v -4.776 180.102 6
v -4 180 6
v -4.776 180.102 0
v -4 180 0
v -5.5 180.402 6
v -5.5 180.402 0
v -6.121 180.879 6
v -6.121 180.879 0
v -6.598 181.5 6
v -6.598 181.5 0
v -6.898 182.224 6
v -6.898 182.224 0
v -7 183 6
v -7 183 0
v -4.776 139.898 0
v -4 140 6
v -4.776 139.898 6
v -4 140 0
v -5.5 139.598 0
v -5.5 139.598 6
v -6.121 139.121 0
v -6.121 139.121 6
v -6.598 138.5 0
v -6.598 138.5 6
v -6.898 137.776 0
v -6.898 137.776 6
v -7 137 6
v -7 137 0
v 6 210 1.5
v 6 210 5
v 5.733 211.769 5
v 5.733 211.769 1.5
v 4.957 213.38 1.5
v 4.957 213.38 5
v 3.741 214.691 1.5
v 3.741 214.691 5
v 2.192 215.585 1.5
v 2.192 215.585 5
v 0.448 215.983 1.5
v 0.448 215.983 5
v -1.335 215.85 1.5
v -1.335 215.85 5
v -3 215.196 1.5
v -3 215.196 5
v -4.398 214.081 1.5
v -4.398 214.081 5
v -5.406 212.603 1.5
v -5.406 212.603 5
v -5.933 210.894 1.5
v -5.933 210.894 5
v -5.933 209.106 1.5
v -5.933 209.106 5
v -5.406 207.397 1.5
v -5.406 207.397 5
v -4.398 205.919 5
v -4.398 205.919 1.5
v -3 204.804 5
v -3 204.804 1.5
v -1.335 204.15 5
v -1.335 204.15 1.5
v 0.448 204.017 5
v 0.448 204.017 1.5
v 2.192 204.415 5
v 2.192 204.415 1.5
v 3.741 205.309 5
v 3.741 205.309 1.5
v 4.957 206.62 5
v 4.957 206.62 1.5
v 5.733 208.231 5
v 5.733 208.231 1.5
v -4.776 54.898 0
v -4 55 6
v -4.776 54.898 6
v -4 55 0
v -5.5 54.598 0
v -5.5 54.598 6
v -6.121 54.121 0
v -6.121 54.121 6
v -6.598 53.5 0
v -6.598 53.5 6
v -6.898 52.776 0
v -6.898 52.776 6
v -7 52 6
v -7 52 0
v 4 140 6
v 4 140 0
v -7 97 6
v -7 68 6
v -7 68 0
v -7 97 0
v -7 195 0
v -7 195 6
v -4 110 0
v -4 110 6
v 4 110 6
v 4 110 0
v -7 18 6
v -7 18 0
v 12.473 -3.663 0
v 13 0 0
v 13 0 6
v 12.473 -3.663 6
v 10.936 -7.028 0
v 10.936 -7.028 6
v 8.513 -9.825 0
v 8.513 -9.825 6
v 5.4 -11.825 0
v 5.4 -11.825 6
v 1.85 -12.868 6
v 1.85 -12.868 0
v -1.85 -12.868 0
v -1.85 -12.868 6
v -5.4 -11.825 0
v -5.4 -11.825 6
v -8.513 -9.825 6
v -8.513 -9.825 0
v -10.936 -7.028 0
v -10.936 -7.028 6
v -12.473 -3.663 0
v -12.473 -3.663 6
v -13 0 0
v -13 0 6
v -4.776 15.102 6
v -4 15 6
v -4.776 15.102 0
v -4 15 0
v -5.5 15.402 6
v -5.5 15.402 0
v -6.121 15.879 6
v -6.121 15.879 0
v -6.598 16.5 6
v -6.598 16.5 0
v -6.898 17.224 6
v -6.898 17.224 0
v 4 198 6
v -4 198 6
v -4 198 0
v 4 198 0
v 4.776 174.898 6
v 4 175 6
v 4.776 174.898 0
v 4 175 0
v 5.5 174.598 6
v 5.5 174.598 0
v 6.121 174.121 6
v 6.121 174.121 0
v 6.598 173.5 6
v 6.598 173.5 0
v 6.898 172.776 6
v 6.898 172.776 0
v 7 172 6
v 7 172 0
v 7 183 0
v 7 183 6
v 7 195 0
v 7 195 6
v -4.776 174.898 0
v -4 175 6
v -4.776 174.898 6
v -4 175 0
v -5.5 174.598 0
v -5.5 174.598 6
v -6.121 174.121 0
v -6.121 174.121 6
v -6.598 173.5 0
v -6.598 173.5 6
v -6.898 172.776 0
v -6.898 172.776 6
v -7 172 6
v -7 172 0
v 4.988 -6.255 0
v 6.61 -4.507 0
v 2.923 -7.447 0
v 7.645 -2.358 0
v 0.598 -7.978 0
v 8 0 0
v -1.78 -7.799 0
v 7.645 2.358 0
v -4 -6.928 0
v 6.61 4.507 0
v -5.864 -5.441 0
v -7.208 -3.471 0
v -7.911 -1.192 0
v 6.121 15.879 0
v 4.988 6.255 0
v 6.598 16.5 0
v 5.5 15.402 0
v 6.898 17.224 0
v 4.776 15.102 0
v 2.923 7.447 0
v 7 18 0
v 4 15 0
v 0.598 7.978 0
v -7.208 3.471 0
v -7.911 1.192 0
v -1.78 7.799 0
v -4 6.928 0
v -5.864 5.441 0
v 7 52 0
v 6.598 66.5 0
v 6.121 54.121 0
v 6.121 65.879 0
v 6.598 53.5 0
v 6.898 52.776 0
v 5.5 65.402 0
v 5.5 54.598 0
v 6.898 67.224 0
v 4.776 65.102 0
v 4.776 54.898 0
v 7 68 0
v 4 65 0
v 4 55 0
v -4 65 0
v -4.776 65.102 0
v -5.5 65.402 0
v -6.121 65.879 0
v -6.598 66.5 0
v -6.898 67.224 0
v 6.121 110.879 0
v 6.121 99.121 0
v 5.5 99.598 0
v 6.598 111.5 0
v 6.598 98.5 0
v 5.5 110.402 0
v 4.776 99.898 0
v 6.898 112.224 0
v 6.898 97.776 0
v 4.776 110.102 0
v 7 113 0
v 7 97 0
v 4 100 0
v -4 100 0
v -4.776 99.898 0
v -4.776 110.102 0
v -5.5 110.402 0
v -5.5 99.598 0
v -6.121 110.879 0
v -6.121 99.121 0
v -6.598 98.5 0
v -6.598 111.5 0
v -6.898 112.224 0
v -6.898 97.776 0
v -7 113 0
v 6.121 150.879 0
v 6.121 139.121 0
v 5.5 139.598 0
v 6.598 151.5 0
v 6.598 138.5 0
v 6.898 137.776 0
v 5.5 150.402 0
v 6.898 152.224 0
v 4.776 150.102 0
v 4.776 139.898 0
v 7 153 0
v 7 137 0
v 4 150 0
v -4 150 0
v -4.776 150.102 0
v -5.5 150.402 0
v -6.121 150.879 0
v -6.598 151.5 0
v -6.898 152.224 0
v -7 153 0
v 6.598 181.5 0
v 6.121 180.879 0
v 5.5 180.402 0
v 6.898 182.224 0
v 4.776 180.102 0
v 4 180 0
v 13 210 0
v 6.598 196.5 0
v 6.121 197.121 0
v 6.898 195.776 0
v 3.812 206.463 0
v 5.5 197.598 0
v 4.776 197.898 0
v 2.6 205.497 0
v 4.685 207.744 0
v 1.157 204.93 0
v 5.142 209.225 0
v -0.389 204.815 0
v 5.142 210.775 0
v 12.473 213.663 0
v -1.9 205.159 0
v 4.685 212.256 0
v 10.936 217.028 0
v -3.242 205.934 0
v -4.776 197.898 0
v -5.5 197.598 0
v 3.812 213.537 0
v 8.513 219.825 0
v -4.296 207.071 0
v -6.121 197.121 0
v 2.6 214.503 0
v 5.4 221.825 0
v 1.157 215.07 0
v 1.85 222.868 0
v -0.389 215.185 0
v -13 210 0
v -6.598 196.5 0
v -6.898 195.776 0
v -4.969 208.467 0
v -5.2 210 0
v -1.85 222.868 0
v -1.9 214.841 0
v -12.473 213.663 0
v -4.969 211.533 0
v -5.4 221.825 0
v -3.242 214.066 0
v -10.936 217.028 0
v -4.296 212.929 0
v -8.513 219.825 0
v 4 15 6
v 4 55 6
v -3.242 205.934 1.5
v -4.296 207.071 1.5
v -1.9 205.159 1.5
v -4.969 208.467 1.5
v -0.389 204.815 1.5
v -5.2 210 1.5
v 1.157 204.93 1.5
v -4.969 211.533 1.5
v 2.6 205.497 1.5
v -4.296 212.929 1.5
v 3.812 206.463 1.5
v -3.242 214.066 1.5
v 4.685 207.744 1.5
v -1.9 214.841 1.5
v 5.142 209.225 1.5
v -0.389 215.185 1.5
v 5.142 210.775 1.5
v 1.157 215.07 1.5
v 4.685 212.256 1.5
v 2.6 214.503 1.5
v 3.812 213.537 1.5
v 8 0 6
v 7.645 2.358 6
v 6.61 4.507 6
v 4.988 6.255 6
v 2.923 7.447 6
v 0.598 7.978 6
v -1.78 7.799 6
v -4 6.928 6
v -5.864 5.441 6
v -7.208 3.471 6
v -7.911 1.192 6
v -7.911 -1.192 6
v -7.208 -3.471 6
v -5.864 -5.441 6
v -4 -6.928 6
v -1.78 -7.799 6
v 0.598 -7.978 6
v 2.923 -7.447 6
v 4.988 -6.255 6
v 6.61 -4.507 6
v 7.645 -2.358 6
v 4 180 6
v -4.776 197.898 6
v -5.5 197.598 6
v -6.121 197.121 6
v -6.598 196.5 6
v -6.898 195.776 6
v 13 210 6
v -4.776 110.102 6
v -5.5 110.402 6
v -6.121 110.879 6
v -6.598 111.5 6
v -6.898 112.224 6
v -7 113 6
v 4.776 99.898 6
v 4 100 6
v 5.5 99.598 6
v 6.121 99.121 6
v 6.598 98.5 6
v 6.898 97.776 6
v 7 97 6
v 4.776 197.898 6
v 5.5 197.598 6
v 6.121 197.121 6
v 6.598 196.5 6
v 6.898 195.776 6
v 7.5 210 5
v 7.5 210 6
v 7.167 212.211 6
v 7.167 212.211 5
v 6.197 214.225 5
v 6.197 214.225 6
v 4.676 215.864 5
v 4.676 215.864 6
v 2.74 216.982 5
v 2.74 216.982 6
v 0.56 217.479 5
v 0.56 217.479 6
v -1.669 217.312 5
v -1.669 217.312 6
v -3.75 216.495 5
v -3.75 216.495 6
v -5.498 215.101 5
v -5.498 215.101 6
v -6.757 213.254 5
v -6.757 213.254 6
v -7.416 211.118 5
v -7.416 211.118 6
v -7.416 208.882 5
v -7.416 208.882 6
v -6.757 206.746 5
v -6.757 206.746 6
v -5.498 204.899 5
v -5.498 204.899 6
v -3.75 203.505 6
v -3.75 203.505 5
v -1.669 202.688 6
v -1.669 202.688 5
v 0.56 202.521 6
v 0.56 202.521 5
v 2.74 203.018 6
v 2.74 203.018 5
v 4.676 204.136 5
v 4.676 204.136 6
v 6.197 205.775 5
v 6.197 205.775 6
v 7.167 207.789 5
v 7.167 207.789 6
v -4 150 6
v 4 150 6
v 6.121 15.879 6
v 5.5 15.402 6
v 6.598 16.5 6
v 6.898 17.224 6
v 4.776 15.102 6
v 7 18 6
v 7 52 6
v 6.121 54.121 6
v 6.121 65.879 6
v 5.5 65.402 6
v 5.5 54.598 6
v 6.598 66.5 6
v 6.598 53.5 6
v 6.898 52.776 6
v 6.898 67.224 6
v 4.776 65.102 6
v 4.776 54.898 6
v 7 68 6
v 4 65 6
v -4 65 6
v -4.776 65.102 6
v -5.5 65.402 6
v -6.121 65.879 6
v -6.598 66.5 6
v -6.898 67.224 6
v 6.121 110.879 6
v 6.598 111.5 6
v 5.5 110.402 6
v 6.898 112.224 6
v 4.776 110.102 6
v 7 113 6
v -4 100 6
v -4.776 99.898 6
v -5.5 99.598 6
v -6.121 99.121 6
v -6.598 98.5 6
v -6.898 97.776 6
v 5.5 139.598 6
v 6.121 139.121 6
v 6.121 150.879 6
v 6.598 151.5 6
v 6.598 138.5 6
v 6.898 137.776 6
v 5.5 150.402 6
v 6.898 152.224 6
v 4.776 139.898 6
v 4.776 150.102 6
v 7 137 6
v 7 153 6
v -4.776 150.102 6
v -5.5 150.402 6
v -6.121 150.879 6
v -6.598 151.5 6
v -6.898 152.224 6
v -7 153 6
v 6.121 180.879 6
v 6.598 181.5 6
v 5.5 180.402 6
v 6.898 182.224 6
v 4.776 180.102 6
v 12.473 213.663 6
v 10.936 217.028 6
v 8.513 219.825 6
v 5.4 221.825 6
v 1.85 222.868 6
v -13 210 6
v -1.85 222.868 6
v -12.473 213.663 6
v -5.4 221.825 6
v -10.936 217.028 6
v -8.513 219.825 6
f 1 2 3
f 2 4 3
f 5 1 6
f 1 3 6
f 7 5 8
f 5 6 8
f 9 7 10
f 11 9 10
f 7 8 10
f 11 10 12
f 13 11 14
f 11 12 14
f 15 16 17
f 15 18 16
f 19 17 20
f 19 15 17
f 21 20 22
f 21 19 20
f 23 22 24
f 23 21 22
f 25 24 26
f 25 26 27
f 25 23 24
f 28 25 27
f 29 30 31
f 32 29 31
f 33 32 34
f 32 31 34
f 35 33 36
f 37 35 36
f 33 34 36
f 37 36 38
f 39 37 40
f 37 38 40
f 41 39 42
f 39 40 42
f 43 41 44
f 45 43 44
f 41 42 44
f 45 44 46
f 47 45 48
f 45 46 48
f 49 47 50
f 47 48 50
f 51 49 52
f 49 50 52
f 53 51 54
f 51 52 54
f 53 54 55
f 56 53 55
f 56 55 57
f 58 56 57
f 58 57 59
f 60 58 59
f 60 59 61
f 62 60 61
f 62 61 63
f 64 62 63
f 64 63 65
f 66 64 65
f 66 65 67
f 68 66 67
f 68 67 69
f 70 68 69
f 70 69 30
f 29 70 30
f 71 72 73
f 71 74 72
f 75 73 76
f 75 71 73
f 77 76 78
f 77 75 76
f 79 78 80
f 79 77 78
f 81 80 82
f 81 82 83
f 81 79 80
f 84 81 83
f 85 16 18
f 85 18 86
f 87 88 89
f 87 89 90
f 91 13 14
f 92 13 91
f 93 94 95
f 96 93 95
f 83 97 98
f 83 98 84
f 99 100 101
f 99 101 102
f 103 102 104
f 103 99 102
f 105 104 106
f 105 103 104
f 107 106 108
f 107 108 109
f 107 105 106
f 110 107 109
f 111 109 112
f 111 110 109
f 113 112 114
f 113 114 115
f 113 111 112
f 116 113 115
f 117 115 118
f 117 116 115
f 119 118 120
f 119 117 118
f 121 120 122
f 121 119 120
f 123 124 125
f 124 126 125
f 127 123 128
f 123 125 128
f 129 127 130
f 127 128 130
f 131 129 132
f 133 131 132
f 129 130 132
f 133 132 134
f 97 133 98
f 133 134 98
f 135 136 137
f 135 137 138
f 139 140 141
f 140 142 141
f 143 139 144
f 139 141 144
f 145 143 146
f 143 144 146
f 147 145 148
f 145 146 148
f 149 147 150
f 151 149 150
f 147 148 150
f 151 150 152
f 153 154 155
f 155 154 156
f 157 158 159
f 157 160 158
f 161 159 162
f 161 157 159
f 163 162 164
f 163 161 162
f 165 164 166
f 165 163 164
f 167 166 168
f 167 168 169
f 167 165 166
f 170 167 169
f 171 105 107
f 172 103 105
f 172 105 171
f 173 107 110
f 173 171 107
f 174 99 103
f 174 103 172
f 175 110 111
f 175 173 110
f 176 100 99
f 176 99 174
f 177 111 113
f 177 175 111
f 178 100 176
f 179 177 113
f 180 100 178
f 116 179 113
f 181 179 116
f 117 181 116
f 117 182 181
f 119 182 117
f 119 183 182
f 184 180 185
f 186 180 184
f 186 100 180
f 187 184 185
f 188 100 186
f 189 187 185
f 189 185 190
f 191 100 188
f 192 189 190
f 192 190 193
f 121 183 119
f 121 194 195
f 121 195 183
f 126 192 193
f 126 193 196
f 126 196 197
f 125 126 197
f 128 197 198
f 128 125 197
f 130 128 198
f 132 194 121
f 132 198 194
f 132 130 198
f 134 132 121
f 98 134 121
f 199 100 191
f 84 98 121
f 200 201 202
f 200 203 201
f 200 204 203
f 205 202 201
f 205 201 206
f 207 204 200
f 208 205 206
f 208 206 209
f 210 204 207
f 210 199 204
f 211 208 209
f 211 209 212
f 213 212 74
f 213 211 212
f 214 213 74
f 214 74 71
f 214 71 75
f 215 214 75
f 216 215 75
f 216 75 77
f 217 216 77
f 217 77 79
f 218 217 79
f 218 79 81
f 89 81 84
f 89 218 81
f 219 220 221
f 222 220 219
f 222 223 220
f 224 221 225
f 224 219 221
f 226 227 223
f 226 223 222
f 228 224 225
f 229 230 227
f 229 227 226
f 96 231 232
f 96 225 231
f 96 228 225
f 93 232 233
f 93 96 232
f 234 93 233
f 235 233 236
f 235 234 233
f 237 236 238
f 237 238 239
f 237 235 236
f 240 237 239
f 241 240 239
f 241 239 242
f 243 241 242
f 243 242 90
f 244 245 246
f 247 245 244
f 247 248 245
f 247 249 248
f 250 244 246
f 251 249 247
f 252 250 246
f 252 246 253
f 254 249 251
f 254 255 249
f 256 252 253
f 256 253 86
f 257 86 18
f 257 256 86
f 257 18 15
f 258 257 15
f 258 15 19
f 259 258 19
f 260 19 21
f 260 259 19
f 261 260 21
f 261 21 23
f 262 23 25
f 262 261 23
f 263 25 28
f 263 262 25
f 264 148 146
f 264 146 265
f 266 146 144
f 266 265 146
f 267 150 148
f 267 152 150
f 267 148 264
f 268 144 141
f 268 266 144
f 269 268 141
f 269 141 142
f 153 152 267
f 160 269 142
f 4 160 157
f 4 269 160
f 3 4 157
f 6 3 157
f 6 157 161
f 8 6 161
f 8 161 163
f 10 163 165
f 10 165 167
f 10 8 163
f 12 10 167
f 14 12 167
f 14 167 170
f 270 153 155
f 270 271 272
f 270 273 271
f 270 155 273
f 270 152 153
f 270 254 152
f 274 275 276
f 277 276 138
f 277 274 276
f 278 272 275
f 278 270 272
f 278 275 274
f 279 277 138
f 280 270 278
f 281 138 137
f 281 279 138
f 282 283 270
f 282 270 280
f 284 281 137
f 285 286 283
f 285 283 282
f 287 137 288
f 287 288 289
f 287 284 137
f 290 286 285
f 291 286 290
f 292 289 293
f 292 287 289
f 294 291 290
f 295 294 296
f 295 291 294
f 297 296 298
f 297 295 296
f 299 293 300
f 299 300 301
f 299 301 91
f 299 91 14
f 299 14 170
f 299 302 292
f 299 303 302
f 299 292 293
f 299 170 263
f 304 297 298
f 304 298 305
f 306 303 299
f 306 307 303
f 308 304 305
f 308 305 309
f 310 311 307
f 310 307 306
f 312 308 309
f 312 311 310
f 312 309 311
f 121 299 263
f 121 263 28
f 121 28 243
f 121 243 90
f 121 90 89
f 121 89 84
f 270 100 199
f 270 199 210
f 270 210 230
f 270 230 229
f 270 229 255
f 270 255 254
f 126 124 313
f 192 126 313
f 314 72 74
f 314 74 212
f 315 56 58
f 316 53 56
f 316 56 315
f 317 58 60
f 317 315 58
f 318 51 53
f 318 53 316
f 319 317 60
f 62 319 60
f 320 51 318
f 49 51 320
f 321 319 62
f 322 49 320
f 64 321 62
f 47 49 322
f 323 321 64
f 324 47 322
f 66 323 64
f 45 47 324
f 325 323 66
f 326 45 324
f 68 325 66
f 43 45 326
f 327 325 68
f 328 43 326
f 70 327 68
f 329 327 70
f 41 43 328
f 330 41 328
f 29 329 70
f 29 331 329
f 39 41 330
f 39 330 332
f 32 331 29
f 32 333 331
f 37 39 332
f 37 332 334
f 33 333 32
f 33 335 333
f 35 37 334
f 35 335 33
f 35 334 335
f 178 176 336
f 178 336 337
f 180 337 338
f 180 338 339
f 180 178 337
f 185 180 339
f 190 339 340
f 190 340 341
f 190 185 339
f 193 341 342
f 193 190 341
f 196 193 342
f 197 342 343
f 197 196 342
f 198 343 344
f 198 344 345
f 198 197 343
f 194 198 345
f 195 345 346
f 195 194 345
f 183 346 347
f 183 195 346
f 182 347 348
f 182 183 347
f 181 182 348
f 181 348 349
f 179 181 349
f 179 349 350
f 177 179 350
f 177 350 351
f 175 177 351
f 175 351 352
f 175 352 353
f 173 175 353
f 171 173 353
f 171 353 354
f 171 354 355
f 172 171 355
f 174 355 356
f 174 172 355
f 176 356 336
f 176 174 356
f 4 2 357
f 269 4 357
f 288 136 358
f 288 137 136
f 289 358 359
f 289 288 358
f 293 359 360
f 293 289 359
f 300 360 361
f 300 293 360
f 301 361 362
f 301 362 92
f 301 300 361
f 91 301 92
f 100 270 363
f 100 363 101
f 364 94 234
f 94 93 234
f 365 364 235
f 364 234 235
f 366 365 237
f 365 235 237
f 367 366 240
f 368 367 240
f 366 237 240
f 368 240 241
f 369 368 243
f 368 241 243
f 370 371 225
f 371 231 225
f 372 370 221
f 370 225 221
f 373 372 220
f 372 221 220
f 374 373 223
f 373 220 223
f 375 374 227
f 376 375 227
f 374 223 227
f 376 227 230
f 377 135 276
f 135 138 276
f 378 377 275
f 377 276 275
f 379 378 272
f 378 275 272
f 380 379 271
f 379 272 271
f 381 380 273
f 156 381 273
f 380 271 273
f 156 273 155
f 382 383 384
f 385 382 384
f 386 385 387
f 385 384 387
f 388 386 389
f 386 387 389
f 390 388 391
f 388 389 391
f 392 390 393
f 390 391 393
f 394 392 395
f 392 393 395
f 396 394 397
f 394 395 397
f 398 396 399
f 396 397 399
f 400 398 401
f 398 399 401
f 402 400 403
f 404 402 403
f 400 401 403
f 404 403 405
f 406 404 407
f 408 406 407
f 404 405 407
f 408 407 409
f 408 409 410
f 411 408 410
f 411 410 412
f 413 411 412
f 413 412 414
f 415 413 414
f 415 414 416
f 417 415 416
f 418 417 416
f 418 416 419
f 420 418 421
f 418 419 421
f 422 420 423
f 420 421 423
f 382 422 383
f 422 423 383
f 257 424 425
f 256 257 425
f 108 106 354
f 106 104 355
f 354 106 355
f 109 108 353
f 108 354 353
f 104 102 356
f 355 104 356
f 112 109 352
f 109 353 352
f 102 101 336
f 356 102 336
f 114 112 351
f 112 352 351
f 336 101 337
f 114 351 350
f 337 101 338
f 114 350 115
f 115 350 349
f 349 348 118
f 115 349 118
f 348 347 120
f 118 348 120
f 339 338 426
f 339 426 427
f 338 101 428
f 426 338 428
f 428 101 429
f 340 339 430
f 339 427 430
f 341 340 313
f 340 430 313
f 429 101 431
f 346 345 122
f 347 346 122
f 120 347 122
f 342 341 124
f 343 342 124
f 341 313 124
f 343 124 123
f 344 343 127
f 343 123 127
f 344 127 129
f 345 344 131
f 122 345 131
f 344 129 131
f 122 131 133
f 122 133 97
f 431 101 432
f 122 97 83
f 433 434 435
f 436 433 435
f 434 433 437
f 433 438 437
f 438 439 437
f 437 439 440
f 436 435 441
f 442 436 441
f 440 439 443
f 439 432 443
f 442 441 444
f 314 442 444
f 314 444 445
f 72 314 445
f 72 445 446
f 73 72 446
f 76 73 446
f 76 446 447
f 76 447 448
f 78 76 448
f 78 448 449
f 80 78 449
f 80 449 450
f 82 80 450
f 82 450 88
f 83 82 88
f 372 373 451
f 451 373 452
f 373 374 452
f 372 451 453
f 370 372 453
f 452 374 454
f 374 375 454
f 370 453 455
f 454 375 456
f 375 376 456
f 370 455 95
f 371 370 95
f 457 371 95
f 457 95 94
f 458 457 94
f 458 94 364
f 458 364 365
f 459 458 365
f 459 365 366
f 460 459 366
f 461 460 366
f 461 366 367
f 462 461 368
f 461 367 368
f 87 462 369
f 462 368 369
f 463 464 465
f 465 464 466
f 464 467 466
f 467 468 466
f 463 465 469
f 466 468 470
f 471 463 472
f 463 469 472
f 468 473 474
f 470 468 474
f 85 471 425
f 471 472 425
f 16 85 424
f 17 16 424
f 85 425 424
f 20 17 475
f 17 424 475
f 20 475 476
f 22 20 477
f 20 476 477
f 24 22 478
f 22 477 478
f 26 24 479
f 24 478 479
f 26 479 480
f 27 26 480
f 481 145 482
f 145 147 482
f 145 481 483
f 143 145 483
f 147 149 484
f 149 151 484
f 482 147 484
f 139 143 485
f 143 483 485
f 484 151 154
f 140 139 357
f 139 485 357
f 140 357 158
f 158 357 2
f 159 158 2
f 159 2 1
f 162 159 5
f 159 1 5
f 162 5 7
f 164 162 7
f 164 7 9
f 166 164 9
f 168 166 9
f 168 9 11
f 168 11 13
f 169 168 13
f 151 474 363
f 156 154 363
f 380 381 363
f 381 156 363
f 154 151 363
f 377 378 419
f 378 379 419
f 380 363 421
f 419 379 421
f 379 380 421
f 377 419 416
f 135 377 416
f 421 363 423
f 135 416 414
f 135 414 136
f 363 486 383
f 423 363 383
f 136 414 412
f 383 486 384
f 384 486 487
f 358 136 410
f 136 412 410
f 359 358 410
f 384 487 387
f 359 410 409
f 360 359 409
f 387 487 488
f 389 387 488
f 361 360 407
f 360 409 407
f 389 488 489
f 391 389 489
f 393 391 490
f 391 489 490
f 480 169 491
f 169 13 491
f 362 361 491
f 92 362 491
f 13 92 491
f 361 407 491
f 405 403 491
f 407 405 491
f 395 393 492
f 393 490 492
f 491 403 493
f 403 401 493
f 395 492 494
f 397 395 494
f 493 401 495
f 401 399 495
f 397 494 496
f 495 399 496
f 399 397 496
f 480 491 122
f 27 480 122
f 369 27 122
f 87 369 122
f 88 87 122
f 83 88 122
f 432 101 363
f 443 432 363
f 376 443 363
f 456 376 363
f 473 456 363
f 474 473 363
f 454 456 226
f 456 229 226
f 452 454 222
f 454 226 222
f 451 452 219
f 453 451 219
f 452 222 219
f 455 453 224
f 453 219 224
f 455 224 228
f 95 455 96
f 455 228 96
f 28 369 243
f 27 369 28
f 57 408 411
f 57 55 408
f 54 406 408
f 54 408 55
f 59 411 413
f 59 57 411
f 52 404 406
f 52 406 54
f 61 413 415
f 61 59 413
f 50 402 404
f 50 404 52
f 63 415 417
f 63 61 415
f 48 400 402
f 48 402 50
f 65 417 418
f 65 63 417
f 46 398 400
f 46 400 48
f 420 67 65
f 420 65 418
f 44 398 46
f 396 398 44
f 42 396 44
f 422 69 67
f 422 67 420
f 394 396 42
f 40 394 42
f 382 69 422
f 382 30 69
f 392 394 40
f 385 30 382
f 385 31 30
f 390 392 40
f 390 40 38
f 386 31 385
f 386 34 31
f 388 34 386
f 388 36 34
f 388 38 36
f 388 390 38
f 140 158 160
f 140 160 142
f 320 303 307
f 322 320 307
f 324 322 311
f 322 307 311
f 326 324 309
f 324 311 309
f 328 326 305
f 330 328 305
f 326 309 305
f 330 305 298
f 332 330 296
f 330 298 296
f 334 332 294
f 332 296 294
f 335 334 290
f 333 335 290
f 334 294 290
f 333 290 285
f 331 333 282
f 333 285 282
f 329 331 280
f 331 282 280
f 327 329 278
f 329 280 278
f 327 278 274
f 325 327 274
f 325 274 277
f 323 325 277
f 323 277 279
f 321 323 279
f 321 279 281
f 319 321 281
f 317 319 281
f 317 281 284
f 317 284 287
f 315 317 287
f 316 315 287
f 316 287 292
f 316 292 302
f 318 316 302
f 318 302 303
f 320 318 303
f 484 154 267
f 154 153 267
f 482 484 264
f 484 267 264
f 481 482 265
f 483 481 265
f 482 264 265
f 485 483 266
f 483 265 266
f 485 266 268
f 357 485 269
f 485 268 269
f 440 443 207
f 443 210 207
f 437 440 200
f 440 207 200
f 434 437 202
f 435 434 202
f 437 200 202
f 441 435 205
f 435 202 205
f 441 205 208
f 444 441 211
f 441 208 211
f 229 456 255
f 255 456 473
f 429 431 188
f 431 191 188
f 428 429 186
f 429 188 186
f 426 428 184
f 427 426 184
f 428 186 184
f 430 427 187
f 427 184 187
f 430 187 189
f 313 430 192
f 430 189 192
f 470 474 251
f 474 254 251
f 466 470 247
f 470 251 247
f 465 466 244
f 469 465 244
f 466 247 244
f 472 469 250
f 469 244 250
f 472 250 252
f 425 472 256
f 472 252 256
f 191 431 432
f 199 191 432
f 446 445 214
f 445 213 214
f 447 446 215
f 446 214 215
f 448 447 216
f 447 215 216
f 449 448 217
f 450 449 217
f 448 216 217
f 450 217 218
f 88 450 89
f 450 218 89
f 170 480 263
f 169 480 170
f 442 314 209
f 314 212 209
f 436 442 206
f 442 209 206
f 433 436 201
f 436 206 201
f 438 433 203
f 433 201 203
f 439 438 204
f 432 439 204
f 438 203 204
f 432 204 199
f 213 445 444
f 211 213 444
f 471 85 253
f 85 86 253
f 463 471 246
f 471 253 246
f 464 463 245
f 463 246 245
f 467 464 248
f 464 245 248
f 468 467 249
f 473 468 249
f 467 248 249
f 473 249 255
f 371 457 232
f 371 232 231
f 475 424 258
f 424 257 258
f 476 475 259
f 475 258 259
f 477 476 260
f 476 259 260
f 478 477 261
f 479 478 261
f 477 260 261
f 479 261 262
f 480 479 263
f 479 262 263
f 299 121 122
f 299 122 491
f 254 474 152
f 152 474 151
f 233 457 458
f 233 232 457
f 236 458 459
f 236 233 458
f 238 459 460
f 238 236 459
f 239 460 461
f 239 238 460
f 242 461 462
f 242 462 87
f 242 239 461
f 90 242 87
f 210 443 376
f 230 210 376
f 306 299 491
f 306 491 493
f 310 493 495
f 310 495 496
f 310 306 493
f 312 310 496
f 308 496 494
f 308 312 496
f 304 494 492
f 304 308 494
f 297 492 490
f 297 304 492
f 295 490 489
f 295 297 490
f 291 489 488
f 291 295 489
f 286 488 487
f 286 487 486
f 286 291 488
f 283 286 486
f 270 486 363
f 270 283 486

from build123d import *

# Parameters (mm, degrees)
SKETCH_1_R          = 8
EXTRUDE_1_DEPTH     = 6
SKETCH_2_W          = 14
SKETCH_2_H          = 25
SKETCH_2_H_2        = 30
SKETCH_2_H_3        = 35
SKETCH_2_H_4        = 40
SKETCH_2_H_5        = 18
CUT_EXTRUDE_1_DEPTH = 224.45916853
FILLET_1_R          = 3
SKETCH_3_R          = 8
SKETCH_3_R_2        = 5.2
EXTRUDE_2_DEPTH     = 6
SKETCH_4_R          = 6
CUT_EXTRUDE_2_DEPTH = 4.5
SKETCH_5_R          = 7.5
CUT_EXTRUDE_3_DEPTH = 1


with BuildPart() as part:
    # 草图1 → 凸台-拉伸1 (new body)
    with BuildSketch(Plane.XY):
        with BuildLine():
            Line((-13, 0), (-13, 210))
            ThreePointArc((-13, 210), (0, 223), (13, 210))
            Line((13, 210), (13, 0))
            ThreePointArc((13, 0), (0, -13), (-13, 0))
        make_face()
        Circle(SKETCH_1_R, mode=Mode.SUBTRACT)
        with Locations((0, 210)):
            Circle(SKETCH_1_R, mode=Mode.SUBTRACT)
    extrude(amount=EXTRUDE_1_DEPTH)

    # 草图2 → 切除-拉伸1 (cut, through all)
    with BuildSketch(Plane.XY.offset(6)):
        with Locations((0, 162.5)):
            Rectangle(SKETCH_2_W, SKETCH_2_H)
        with Locations((0, 125)):
            Rectangle(SKETCH_2_W, SKETCH_2_H_2)
        with Locations((0, 82.5)):
            Rectangle(SKETCH_2_W, SKETCH_2_H_3)
        with Locations((0, 35)):
            Rectangle(SKETCH_2_W, SKETCH_2_H_4)
        with Locations((0, 189)):
            Rectangle(SKETCH_2_W, SKETCH_2_H_5)
    extrude(amount=-CUT_EXTRUDE_1_DEPTH, mode=Mode.SUBTRACT)

    # 圆角1
    fillet_1_edges = [part.edges().sort_by_distance(p)[0] for p in [
        (7, 140, 3),
        (7, 110, 3),
        (-7, 110, 3),
        (-7, 140, 3),
        (7, 100, 3),
        (7, 65, 3),
        (-7, 65, 3),
        (-7, 100, 3),
        (7, 55, 3),
        (7, 15, 3),
        (-7, 15, 3),
        (-7, 55, 3),
        (7, 198, 3),
        (7, 180, 3),
        (-7, 180, 3),
        (-7, 198, 3),
        (7, 175, 3),
        (7, 150, 3),
        (-7, 150, 3),
        (-7, 175, 3),
    ]]
    fillet(fillet_1_edges, radius=FILLET_1_R)

    # 草图3 → 凸台-拉伸2 (add)
    with BuildSketch(Plane(origin=(0, 0, 0), x_dir=(-1, 0, 0), z_dir=(0, 0, -1))):
        with Locations((0, 210)):
            Circle(SKETCH_3_R)
        with Locations((0, 210)):
            Circle(SKETCH_3_R_2, mode=Mode.SUBTRACT)
    extrude(amount=-EXTRUDE_2_DEPTH)

    # 草图4 → 切除-拉伸2 (cut)
    with BuildSketch(Plane.XY.offset(6)):
        with Locations((0, 210)):
            Circle(SKETCH_4_R)
    extrude(amount=-CUT_EXTRUDE_2_DEPTH, mode=Mode.SUBTRACT)

    # 草图5 → 切除-拉伸3 (cut)
    with BuildSketch(Plane.XY.offset(6)):
        with Locations((0, 210)):
            Circle(SKETCH_5_R)
    extrude(amount=-CUT_EXTRUDE_3_DEPTH, mode=Mode.SUBTRACT)


solid = part.part
